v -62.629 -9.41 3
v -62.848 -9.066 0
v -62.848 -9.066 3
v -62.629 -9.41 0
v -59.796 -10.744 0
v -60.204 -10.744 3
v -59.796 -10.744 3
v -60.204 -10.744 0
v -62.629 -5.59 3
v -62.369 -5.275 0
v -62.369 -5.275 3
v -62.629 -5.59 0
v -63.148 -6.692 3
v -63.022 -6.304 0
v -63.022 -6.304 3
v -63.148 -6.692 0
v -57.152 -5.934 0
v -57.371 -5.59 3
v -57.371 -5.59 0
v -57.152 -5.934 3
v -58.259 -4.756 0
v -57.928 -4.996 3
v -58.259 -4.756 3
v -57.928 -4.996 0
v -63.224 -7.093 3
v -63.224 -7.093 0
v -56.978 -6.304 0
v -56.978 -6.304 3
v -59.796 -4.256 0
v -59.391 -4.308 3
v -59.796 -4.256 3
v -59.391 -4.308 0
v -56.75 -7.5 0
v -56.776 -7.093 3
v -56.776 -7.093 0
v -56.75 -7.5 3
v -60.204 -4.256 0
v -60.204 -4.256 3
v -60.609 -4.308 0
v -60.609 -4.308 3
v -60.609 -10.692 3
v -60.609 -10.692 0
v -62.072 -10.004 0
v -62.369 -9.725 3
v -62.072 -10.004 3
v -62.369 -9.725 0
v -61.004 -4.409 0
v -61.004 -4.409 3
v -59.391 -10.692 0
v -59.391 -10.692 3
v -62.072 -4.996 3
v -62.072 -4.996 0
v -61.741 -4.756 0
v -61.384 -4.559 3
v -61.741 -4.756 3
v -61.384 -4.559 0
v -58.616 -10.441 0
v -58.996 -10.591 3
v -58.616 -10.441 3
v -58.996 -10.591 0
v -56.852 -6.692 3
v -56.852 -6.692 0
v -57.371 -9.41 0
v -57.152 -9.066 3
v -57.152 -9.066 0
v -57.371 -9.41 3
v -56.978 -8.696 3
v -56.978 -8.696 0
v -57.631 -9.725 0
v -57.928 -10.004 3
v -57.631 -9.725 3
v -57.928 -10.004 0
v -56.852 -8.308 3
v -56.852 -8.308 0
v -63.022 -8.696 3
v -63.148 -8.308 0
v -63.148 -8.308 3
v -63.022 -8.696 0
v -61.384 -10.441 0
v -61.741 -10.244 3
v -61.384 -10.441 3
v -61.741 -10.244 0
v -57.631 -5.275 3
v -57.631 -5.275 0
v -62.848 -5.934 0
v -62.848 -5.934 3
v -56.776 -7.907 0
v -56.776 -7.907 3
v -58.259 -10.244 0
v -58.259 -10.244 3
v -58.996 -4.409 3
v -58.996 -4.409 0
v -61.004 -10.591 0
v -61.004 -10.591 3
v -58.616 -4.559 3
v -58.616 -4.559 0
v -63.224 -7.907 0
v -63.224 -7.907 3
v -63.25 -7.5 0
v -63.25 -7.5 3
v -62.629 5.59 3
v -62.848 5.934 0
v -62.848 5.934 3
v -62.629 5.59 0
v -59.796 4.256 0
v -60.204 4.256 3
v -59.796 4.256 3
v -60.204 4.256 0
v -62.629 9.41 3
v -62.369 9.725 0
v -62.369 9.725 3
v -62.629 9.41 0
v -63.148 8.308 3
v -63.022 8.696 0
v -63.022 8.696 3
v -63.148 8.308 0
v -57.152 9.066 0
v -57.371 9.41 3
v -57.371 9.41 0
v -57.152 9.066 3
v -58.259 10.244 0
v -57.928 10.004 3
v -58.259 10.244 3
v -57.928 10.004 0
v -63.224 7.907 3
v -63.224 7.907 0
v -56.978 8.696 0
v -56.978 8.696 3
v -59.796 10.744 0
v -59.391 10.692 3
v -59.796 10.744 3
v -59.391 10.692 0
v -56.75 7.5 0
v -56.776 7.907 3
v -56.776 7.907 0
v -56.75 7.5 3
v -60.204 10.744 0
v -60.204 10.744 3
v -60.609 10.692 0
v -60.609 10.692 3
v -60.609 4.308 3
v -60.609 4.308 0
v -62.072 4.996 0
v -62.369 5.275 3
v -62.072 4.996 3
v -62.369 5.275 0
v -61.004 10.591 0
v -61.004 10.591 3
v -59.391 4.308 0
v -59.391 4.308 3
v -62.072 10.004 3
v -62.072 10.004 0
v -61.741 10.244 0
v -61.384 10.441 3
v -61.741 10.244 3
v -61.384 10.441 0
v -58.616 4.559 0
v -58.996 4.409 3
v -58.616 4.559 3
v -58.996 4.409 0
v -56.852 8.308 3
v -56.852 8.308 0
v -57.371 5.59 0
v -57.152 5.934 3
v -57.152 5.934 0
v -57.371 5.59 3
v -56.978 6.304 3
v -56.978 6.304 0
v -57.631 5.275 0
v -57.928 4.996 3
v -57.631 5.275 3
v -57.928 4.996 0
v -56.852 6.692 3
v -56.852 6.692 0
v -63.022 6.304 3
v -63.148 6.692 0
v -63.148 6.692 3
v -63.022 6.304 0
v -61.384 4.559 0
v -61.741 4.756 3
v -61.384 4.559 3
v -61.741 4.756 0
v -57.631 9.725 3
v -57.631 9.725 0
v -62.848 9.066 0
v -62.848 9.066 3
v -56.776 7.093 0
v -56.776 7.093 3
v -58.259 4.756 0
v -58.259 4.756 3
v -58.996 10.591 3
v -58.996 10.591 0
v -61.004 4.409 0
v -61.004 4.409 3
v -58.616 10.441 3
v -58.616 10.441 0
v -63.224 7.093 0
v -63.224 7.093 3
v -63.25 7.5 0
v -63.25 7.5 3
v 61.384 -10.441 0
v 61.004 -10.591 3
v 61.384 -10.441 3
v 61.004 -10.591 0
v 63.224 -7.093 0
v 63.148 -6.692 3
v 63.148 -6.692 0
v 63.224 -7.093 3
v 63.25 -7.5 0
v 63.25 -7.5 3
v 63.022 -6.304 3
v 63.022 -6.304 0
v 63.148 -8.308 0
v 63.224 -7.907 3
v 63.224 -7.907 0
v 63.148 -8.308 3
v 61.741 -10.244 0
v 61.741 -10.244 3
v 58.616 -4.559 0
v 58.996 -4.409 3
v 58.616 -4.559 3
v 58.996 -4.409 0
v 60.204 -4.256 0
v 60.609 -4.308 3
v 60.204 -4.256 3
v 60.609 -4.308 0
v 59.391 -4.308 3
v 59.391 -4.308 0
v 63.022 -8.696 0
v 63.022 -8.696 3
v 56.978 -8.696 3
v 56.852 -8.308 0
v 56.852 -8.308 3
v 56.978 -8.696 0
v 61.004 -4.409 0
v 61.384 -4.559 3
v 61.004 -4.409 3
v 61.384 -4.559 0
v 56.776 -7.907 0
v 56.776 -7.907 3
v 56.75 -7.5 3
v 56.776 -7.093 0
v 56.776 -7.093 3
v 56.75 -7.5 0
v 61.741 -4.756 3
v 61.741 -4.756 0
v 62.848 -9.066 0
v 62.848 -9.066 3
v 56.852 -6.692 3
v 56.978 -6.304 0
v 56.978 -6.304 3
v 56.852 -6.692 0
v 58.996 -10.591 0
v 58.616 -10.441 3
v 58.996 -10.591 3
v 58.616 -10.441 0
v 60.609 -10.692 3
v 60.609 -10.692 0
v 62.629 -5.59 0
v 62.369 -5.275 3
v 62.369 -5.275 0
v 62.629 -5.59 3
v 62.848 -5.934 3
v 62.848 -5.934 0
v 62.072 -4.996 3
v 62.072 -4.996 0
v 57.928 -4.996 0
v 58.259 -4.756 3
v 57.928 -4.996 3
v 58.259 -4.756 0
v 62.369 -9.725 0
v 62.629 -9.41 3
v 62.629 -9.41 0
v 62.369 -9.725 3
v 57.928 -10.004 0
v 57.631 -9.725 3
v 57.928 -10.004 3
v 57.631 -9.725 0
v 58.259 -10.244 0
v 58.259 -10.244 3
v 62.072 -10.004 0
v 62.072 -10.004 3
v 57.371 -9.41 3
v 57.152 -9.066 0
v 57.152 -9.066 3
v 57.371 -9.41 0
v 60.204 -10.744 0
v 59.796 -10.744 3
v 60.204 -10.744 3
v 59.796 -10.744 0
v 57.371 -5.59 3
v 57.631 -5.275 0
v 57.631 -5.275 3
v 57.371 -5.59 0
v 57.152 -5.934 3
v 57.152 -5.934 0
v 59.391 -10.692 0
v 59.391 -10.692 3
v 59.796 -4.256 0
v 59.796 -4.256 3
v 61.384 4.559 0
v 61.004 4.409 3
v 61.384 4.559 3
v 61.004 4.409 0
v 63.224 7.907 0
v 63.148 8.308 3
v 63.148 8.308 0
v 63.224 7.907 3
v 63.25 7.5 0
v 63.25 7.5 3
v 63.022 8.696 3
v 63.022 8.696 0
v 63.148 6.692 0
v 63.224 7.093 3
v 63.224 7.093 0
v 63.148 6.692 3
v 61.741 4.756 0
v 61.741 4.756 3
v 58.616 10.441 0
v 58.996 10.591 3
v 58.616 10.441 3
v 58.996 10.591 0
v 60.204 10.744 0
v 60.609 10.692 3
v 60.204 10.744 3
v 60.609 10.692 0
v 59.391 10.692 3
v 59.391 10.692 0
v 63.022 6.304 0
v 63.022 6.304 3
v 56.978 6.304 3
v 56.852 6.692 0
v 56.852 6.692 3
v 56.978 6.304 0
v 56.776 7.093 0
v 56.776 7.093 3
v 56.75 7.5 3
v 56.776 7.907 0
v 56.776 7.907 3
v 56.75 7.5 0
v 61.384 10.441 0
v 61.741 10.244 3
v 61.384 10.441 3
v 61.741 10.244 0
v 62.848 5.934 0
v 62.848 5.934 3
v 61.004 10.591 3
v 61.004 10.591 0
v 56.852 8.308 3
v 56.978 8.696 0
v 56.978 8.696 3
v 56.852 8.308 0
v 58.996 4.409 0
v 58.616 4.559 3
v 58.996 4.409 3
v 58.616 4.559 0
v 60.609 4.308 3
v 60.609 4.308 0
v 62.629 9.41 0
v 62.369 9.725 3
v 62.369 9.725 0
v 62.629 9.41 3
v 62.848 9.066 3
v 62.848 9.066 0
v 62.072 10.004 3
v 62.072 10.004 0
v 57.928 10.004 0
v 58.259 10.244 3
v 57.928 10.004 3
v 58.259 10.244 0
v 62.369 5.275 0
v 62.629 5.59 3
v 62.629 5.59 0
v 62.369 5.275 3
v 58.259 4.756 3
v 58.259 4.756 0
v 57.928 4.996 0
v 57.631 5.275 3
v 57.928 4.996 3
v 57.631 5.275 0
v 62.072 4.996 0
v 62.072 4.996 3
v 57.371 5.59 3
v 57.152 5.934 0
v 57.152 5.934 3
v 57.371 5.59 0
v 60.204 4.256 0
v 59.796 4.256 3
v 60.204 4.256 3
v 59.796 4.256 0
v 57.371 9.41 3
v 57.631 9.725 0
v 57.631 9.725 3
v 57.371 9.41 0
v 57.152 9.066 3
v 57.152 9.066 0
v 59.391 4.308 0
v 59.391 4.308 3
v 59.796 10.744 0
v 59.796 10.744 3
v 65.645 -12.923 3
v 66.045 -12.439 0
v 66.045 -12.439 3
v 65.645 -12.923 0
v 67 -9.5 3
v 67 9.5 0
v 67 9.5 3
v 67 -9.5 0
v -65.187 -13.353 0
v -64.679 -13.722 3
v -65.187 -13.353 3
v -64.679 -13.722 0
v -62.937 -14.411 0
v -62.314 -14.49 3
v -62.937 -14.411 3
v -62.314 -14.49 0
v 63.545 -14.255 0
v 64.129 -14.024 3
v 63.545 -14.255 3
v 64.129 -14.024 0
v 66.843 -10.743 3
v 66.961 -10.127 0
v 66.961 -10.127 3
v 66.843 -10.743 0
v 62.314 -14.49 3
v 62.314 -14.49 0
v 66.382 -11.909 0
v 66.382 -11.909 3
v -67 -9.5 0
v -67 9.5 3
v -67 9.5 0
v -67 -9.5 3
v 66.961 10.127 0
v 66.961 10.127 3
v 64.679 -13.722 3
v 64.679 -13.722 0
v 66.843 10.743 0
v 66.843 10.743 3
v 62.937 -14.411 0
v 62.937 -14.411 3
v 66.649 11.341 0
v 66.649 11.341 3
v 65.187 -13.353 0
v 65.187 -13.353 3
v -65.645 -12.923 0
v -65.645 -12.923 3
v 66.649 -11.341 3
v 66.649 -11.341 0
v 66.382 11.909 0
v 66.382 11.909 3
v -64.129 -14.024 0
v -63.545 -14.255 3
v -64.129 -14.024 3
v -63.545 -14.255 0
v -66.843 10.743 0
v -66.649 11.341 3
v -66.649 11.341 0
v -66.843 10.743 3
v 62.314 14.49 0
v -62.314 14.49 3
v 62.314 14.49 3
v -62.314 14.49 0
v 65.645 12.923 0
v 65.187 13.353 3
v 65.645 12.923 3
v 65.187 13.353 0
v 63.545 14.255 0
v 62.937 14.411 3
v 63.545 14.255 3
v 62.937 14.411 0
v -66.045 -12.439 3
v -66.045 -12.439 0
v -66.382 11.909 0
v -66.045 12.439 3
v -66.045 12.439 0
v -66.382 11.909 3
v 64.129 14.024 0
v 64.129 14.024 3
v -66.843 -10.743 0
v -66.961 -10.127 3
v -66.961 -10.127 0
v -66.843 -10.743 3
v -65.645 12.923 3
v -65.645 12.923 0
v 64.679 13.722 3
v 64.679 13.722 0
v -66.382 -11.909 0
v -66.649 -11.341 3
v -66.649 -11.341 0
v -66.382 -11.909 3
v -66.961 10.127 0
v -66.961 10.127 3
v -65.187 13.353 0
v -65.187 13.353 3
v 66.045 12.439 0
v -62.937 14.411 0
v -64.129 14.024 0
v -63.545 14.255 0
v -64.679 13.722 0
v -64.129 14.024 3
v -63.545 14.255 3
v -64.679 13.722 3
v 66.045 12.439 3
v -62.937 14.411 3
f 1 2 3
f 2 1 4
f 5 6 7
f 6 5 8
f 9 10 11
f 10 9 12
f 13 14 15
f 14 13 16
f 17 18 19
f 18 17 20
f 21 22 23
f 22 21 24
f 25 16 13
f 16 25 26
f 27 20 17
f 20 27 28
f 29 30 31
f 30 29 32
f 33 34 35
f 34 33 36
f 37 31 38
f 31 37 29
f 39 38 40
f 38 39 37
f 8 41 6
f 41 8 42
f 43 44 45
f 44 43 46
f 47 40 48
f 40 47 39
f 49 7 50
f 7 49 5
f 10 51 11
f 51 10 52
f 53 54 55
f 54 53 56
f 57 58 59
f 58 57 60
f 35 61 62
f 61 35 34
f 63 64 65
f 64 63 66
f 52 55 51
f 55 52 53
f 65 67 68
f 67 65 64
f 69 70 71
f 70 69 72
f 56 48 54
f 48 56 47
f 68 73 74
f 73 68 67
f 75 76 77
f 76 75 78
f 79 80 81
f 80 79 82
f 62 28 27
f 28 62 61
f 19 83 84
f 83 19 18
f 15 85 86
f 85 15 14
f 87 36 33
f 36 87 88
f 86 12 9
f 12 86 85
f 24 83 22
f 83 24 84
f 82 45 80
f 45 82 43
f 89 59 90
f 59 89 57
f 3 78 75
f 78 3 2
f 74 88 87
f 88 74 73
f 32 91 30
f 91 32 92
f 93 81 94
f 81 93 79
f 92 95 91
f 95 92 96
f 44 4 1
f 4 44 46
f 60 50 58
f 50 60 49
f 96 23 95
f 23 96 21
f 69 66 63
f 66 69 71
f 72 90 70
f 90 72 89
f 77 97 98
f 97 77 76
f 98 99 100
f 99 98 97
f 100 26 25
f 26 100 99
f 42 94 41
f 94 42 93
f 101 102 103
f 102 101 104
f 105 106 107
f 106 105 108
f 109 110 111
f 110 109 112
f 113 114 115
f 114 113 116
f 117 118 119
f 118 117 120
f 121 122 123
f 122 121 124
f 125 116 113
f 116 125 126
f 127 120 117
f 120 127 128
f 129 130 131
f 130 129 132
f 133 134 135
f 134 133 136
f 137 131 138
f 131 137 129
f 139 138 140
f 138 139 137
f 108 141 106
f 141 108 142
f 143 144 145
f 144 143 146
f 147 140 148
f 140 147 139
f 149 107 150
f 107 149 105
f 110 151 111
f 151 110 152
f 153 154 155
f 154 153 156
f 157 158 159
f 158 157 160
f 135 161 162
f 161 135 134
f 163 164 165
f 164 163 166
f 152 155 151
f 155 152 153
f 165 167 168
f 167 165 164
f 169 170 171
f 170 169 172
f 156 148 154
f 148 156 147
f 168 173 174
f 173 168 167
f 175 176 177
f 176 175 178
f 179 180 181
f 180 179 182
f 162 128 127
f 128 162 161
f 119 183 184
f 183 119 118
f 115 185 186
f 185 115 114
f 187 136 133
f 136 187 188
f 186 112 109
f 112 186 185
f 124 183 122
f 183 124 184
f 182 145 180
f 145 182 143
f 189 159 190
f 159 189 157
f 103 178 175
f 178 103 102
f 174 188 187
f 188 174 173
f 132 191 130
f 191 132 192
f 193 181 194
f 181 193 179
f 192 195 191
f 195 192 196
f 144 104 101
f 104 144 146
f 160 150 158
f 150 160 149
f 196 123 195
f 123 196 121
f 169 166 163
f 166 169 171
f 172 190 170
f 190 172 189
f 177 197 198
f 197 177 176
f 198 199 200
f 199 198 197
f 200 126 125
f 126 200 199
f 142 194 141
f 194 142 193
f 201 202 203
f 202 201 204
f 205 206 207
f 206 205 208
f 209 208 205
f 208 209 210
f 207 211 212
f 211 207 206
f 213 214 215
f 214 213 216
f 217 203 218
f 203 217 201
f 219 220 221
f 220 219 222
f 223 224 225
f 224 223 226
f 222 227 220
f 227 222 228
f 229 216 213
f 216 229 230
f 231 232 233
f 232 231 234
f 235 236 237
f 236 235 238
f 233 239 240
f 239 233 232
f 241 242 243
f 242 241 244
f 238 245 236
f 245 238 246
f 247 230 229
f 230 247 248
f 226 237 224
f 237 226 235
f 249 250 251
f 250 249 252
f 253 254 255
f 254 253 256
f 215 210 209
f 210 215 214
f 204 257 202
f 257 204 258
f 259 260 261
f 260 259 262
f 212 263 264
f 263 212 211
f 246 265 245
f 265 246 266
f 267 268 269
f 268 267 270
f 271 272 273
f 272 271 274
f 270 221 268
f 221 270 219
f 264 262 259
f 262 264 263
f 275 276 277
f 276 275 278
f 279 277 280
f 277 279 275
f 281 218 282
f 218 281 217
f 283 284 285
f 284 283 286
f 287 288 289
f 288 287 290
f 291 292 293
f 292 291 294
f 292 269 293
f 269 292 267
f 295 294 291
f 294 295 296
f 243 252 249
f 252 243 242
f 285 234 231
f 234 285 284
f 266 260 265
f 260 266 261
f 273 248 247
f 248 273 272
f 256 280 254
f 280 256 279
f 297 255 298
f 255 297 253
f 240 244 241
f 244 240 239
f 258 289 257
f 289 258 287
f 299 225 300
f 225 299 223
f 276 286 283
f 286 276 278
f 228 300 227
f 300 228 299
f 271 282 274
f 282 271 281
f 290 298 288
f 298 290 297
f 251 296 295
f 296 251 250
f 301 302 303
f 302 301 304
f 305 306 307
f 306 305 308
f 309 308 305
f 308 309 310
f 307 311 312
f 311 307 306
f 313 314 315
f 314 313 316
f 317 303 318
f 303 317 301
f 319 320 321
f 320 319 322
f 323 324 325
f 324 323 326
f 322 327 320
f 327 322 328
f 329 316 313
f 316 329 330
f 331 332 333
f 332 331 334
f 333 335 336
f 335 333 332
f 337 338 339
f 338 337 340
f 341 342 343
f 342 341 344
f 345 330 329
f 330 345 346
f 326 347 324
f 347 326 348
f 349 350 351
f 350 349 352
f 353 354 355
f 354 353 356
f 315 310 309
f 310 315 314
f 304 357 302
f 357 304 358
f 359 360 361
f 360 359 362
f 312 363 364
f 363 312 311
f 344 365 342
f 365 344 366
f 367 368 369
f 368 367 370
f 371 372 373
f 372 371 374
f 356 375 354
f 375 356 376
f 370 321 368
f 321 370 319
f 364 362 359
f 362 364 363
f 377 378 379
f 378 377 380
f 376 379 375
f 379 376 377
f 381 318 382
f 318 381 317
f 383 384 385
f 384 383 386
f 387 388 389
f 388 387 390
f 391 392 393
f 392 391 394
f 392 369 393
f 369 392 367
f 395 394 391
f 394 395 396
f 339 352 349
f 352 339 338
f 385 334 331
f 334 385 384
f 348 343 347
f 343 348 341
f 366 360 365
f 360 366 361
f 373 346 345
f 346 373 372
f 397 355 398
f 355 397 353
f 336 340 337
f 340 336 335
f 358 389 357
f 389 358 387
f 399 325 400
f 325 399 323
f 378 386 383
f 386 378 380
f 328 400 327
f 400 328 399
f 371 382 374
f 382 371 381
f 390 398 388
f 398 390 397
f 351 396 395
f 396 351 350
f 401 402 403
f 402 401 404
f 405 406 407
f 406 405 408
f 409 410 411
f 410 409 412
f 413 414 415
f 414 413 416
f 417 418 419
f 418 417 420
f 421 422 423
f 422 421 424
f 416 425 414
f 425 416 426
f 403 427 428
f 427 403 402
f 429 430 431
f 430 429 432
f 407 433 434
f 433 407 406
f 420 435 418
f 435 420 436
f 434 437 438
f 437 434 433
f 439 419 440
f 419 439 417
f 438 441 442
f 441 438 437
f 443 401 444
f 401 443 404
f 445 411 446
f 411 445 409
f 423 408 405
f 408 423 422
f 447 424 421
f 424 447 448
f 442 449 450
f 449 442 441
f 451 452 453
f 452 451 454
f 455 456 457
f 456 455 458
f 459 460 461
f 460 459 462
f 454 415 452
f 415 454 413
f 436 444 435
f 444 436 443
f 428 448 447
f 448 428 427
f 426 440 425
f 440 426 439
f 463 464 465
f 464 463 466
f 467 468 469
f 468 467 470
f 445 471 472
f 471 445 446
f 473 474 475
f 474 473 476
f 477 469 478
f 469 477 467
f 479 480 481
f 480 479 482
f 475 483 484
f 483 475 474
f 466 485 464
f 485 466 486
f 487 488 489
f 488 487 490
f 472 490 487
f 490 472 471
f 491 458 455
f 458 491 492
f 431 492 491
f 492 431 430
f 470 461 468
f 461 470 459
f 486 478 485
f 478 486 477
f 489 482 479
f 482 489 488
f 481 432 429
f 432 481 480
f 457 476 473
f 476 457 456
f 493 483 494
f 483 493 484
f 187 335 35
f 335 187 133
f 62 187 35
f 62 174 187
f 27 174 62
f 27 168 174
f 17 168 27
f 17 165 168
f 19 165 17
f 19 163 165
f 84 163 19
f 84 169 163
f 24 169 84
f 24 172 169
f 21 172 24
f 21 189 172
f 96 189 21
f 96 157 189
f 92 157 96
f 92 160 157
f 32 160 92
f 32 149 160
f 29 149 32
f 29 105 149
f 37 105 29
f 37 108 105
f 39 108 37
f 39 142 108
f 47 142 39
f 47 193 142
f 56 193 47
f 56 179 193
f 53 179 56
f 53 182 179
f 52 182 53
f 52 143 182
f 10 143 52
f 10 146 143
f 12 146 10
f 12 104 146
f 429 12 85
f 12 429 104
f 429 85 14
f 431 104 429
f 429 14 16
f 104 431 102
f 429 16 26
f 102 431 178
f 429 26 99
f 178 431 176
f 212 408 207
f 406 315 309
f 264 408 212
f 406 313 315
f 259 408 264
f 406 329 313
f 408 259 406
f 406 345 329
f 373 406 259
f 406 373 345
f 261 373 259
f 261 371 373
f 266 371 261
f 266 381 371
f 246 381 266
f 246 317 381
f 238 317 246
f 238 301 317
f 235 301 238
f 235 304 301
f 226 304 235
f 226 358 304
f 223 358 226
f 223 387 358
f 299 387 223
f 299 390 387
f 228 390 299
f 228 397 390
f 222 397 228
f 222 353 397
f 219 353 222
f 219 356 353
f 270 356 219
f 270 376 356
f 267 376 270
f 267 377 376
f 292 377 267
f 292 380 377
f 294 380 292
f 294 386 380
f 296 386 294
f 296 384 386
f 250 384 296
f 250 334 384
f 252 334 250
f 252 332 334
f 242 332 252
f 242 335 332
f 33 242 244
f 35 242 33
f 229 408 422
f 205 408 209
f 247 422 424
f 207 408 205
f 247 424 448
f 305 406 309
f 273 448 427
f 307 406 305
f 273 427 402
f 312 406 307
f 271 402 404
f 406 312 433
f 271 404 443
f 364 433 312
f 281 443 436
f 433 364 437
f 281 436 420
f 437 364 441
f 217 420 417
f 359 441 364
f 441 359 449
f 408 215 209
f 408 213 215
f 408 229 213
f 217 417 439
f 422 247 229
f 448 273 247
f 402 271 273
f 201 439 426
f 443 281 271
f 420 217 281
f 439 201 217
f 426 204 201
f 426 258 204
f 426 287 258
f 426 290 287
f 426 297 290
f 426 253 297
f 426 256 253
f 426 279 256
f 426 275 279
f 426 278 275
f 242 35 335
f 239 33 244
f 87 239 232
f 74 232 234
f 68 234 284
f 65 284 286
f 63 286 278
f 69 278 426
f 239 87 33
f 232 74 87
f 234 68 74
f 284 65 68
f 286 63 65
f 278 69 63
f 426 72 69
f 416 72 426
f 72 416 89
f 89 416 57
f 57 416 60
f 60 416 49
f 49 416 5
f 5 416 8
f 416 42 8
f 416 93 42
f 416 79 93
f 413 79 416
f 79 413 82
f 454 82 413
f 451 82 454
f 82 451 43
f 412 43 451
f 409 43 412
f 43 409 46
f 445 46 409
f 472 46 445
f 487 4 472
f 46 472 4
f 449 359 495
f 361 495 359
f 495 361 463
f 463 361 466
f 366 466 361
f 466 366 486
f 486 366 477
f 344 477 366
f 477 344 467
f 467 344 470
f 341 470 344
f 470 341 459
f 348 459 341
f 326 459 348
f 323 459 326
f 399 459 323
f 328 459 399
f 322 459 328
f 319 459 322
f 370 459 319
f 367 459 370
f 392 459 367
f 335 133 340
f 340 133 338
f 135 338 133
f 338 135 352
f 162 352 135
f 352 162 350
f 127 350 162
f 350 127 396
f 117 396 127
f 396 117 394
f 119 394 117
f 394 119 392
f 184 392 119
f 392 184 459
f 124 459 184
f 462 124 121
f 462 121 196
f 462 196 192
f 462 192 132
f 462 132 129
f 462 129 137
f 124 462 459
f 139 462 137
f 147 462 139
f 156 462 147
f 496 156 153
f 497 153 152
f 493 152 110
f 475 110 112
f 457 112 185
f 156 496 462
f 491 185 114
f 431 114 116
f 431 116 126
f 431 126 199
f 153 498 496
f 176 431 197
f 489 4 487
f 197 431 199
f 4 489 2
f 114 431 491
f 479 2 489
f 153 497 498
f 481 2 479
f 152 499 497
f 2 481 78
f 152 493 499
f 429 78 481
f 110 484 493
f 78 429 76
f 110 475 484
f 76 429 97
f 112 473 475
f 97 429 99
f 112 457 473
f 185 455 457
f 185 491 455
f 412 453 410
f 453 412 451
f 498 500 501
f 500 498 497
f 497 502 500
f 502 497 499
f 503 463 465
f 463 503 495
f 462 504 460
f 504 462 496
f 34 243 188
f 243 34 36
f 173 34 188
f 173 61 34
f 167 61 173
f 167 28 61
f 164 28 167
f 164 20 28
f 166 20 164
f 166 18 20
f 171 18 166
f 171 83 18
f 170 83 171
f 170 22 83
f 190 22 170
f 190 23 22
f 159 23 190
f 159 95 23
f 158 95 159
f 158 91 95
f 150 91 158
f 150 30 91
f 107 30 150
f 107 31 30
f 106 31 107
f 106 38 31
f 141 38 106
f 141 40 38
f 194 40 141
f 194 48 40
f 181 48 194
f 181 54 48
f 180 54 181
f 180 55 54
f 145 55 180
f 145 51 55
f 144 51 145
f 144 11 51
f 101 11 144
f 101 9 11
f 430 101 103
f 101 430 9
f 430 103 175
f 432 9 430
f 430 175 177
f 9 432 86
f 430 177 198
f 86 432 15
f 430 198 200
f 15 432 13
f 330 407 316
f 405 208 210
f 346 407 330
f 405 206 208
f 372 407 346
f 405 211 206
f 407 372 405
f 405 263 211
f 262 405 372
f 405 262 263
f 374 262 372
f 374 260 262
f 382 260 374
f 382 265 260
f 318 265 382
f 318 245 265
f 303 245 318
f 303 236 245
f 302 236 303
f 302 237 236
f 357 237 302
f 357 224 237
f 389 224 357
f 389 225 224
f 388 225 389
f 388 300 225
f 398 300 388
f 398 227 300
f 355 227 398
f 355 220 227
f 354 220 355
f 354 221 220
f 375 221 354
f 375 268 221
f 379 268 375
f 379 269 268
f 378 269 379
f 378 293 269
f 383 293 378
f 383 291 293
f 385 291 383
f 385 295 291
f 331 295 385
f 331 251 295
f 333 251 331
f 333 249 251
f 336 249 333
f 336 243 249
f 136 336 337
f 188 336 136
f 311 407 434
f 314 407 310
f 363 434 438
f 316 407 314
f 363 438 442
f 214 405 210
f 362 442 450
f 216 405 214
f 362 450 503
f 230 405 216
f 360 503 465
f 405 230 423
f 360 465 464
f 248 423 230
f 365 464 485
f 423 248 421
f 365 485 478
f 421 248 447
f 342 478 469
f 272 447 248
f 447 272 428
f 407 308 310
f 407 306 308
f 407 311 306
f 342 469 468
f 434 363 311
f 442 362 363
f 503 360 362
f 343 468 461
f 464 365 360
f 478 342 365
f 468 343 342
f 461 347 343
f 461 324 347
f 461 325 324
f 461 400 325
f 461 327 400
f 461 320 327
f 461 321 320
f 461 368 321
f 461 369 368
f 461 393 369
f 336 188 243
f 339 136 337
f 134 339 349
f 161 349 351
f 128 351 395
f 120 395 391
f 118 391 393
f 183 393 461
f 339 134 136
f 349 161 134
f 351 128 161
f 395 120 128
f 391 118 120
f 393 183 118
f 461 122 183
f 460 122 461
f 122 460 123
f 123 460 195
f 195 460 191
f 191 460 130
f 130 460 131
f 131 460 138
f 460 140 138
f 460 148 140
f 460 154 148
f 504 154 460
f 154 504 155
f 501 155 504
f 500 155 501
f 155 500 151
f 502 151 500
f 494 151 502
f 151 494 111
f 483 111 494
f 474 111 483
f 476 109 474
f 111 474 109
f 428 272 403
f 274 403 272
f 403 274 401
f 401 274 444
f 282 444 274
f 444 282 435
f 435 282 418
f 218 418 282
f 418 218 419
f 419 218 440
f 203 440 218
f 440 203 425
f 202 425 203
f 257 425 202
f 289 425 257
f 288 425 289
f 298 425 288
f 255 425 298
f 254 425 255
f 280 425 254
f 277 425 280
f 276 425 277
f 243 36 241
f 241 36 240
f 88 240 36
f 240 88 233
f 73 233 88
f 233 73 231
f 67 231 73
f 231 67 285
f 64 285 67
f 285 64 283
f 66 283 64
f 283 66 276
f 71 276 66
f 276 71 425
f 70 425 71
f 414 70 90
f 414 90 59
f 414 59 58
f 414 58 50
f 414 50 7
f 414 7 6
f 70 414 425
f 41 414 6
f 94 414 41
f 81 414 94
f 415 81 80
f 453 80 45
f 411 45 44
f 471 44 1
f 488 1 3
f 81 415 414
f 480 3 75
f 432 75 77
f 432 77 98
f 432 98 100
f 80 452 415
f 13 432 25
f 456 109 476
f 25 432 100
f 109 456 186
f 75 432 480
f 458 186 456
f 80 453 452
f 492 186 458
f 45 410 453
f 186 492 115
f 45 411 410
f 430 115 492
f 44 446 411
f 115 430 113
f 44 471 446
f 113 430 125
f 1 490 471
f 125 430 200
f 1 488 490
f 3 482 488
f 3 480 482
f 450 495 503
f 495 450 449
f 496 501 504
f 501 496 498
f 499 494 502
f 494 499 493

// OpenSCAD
$fn = 50;


difference() {
	union() {
		hull() {
			translate(v = [-62.0000000000, 9.5000000000, 0]) {
				cylinder(h = 3, r = 5);
			}
			translate(v = [62.0000000000, 9.5000000000, 0]) {
				cylinder(h = 3, r = 5);
			}
			translate(v = [-62.0000000000, -9.5000000000, 0]) {
				cylinder(h = 3, r = 5);
			}
			translate(v = [62.0000000000, -9.5000000000, 0]) {
				cylinder(h = 3, r = 5);
			}
		}
	}
	union() {
		translate(v = [-60.0000000000, -7.5000000000, -100.0000000000]) {
			cylinder(h = 200, r = 3.2500000000);
		}
		translate(v = [-60.0000000000, 7.5000000000, -100.0000000000]) {
			cylinder(h = 200, r = 3.2500000000);
		}
		translate(v = [60.0000000000, -7.5000000000, -100.0000000000]) {
			cylinder(h = 200, r = 3.2500000000);
		}
		translate(v = [60.0000000000, 7.5000000000, -100.0000000000]) {
			cylinder(h = 200, r = 3.2500000000);
		}
	}
}
